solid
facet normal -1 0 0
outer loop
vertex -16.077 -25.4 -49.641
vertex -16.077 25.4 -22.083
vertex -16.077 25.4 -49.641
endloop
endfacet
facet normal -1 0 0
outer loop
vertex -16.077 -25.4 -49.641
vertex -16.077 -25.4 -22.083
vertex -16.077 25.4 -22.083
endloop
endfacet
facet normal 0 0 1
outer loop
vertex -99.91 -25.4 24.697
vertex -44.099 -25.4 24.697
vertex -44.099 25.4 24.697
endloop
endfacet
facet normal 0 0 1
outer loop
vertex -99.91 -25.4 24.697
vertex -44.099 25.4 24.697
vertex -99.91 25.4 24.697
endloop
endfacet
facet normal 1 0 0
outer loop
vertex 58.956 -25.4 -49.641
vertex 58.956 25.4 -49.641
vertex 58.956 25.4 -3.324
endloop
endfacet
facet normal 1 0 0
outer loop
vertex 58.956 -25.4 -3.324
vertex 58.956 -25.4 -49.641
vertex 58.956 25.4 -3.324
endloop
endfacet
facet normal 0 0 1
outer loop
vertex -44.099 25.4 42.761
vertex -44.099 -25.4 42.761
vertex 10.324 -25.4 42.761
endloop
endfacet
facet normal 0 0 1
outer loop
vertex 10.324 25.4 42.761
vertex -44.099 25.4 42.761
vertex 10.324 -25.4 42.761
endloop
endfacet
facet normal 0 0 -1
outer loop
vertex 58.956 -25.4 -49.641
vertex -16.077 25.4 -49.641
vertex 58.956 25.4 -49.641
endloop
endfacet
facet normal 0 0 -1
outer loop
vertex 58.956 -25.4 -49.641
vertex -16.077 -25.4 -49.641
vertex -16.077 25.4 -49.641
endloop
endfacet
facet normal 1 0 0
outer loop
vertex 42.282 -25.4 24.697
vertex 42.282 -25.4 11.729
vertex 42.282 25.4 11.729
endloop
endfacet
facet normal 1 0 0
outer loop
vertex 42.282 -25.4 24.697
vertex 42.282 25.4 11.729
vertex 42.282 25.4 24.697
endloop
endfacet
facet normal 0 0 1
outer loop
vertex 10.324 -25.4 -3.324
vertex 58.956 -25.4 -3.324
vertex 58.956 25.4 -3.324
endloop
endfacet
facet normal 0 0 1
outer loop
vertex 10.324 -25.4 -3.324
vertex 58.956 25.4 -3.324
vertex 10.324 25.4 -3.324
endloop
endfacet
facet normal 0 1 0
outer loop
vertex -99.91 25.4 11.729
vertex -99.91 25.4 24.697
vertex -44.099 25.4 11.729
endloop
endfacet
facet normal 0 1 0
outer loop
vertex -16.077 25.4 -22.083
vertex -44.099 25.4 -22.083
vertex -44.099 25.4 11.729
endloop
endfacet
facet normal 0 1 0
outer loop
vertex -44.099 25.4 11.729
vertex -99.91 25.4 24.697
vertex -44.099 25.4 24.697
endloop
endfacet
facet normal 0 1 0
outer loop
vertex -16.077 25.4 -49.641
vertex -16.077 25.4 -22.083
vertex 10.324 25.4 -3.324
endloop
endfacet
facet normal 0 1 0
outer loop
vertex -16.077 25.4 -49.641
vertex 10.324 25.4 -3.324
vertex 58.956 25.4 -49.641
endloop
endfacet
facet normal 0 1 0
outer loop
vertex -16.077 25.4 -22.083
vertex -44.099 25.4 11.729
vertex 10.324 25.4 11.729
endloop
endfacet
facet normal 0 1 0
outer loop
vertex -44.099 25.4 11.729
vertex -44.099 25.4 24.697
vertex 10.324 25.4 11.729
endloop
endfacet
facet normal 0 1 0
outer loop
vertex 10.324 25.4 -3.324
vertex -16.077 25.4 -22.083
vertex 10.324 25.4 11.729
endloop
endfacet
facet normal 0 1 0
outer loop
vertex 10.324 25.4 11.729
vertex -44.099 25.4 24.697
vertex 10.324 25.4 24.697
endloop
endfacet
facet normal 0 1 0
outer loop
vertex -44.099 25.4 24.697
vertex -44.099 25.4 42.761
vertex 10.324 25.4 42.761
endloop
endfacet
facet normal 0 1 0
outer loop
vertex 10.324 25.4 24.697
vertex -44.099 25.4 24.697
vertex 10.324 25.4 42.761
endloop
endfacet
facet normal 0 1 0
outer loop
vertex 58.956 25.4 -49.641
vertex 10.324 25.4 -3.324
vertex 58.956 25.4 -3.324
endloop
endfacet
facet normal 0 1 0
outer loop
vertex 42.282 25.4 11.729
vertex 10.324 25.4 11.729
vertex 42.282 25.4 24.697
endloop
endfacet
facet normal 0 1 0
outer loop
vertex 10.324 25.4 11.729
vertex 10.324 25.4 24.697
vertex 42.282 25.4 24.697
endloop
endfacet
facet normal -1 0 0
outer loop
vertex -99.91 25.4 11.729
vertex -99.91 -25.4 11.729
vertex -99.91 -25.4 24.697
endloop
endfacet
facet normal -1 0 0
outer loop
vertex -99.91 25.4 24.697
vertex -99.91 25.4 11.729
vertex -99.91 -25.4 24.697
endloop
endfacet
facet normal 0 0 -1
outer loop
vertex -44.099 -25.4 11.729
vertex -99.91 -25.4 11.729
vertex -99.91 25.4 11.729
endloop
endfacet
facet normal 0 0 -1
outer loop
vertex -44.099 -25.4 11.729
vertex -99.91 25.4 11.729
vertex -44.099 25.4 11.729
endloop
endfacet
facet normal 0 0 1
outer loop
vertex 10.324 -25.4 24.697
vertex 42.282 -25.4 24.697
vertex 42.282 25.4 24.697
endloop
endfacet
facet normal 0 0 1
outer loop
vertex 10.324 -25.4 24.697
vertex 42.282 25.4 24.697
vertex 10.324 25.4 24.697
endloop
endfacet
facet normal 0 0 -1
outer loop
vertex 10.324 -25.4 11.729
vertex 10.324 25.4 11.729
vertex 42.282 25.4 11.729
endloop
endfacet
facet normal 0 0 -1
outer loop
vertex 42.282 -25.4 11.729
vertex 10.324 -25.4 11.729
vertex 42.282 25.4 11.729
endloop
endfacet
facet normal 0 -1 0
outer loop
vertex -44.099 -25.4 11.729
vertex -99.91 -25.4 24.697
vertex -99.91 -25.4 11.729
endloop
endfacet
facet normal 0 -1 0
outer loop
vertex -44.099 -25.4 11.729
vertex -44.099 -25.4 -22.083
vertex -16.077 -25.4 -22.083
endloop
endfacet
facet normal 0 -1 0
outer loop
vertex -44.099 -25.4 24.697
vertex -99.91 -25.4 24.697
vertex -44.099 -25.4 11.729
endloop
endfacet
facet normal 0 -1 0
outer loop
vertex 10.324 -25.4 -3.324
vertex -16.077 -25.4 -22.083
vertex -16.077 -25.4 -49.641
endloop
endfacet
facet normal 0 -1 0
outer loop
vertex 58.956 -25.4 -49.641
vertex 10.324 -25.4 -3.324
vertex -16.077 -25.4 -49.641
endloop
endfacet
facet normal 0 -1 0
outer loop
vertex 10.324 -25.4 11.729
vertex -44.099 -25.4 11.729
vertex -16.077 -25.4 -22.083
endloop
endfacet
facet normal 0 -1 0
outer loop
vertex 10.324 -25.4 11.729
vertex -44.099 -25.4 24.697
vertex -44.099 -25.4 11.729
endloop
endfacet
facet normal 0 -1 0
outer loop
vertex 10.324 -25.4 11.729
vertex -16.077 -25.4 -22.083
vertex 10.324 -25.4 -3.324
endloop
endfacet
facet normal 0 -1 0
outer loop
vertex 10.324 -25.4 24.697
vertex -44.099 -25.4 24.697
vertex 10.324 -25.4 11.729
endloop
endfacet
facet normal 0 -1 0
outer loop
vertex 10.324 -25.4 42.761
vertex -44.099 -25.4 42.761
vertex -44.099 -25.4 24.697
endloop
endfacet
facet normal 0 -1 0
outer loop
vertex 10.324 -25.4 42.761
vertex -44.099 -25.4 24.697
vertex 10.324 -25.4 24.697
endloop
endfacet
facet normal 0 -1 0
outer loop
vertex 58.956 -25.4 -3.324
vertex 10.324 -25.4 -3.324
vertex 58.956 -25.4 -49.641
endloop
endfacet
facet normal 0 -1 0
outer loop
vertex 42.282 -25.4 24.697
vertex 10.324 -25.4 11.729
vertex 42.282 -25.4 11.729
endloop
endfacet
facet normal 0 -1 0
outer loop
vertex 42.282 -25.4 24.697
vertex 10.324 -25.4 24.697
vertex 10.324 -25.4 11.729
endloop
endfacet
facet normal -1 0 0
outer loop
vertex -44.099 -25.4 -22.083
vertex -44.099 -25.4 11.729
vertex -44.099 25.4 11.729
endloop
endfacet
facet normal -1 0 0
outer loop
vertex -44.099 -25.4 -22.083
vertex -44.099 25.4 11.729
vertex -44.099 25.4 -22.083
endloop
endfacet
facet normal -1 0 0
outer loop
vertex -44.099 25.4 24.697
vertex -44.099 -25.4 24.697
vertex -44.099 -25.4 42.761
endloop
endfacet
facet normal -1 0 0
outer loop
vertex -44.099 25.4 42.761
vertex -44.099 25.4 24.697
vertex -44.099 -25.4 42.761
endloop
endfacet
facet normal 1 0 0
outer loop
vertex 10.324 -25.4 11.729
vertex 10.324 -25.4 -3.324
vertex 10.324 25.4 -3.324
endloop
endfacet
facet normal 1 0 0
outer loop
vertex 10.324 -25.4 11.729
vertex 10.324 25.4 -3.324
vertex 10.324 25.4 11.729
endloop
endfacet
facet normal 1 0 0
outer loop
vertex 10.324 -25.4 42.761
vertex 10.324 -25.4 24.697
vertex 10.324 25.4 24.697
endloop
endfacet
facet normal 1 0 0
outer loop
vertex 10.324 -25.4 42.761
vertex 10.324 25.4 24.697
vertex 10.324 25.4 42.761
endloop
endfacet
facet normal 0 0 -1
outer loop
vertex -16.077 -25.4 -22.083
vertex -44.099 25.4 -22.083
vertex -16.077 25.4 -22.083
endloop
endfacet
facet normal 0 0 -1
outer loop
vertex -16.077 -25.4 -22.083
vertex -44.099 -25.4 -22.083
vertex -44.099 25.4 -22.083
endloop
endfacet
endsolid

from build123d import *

# Parameters (mm, degrees)
F0_W     = 26.4005409554
F0_H     = 18.7582788058
F0_W_2   = 54.4221671298
F0_H_2   = 12.9686864093
F0_W_3   = 31.9585492834
F0_W_4   = 55.8116771281
F0_H_3   = 18.0635303259
F1_DEPTH = 25.4


with BuildPart() as f1:
    # F0 (on Front) → F1 (new body, symmetric)
    with BuildSketch(Plane.XZ):
        Polygon((-16.0769931972, -49.6410056949), (58.9561276138, -49.6410056949), (58.9561276138, -3.3242679201), (10.3235477582, -3.3242679201), (10.3235477582, -22.0825467259), (-16.0769931972, -22.0825467259), align=None)
        Polygon((-44.0986193717, -22.0825467259), (-16.0769931972, -22.0825467259), (-16.0769931972, -3.3242679201), (10.3235477582, -3.3242679201), (10.3235477582, 11.728673242), (-44.0986193717, 11.728673242), align=None)
        with Locations((-2.8767227195, -12.703407323)):
            Rectangle(F0_W, F0_H)
        with Locations((-16.8875358067, 18.2130164467)):
            Rectangle(F0_W_2, F0_H_2)
        with Locations((26.3028223999, 18.2130164467)):
            Rectangle(F0_W_3, F0_H_2)
        with Locations((-72.0044579357, 18.2130164467)):
            Rectangle(F0_W_4, F0_H_2)
        with Locations((-16.8875358067, 33.7291248143)):
            Rectangle(F0_W_2, F0_H_3)
    extrude(amount=F1_DEPTH, both=True)


solid = f1.part
